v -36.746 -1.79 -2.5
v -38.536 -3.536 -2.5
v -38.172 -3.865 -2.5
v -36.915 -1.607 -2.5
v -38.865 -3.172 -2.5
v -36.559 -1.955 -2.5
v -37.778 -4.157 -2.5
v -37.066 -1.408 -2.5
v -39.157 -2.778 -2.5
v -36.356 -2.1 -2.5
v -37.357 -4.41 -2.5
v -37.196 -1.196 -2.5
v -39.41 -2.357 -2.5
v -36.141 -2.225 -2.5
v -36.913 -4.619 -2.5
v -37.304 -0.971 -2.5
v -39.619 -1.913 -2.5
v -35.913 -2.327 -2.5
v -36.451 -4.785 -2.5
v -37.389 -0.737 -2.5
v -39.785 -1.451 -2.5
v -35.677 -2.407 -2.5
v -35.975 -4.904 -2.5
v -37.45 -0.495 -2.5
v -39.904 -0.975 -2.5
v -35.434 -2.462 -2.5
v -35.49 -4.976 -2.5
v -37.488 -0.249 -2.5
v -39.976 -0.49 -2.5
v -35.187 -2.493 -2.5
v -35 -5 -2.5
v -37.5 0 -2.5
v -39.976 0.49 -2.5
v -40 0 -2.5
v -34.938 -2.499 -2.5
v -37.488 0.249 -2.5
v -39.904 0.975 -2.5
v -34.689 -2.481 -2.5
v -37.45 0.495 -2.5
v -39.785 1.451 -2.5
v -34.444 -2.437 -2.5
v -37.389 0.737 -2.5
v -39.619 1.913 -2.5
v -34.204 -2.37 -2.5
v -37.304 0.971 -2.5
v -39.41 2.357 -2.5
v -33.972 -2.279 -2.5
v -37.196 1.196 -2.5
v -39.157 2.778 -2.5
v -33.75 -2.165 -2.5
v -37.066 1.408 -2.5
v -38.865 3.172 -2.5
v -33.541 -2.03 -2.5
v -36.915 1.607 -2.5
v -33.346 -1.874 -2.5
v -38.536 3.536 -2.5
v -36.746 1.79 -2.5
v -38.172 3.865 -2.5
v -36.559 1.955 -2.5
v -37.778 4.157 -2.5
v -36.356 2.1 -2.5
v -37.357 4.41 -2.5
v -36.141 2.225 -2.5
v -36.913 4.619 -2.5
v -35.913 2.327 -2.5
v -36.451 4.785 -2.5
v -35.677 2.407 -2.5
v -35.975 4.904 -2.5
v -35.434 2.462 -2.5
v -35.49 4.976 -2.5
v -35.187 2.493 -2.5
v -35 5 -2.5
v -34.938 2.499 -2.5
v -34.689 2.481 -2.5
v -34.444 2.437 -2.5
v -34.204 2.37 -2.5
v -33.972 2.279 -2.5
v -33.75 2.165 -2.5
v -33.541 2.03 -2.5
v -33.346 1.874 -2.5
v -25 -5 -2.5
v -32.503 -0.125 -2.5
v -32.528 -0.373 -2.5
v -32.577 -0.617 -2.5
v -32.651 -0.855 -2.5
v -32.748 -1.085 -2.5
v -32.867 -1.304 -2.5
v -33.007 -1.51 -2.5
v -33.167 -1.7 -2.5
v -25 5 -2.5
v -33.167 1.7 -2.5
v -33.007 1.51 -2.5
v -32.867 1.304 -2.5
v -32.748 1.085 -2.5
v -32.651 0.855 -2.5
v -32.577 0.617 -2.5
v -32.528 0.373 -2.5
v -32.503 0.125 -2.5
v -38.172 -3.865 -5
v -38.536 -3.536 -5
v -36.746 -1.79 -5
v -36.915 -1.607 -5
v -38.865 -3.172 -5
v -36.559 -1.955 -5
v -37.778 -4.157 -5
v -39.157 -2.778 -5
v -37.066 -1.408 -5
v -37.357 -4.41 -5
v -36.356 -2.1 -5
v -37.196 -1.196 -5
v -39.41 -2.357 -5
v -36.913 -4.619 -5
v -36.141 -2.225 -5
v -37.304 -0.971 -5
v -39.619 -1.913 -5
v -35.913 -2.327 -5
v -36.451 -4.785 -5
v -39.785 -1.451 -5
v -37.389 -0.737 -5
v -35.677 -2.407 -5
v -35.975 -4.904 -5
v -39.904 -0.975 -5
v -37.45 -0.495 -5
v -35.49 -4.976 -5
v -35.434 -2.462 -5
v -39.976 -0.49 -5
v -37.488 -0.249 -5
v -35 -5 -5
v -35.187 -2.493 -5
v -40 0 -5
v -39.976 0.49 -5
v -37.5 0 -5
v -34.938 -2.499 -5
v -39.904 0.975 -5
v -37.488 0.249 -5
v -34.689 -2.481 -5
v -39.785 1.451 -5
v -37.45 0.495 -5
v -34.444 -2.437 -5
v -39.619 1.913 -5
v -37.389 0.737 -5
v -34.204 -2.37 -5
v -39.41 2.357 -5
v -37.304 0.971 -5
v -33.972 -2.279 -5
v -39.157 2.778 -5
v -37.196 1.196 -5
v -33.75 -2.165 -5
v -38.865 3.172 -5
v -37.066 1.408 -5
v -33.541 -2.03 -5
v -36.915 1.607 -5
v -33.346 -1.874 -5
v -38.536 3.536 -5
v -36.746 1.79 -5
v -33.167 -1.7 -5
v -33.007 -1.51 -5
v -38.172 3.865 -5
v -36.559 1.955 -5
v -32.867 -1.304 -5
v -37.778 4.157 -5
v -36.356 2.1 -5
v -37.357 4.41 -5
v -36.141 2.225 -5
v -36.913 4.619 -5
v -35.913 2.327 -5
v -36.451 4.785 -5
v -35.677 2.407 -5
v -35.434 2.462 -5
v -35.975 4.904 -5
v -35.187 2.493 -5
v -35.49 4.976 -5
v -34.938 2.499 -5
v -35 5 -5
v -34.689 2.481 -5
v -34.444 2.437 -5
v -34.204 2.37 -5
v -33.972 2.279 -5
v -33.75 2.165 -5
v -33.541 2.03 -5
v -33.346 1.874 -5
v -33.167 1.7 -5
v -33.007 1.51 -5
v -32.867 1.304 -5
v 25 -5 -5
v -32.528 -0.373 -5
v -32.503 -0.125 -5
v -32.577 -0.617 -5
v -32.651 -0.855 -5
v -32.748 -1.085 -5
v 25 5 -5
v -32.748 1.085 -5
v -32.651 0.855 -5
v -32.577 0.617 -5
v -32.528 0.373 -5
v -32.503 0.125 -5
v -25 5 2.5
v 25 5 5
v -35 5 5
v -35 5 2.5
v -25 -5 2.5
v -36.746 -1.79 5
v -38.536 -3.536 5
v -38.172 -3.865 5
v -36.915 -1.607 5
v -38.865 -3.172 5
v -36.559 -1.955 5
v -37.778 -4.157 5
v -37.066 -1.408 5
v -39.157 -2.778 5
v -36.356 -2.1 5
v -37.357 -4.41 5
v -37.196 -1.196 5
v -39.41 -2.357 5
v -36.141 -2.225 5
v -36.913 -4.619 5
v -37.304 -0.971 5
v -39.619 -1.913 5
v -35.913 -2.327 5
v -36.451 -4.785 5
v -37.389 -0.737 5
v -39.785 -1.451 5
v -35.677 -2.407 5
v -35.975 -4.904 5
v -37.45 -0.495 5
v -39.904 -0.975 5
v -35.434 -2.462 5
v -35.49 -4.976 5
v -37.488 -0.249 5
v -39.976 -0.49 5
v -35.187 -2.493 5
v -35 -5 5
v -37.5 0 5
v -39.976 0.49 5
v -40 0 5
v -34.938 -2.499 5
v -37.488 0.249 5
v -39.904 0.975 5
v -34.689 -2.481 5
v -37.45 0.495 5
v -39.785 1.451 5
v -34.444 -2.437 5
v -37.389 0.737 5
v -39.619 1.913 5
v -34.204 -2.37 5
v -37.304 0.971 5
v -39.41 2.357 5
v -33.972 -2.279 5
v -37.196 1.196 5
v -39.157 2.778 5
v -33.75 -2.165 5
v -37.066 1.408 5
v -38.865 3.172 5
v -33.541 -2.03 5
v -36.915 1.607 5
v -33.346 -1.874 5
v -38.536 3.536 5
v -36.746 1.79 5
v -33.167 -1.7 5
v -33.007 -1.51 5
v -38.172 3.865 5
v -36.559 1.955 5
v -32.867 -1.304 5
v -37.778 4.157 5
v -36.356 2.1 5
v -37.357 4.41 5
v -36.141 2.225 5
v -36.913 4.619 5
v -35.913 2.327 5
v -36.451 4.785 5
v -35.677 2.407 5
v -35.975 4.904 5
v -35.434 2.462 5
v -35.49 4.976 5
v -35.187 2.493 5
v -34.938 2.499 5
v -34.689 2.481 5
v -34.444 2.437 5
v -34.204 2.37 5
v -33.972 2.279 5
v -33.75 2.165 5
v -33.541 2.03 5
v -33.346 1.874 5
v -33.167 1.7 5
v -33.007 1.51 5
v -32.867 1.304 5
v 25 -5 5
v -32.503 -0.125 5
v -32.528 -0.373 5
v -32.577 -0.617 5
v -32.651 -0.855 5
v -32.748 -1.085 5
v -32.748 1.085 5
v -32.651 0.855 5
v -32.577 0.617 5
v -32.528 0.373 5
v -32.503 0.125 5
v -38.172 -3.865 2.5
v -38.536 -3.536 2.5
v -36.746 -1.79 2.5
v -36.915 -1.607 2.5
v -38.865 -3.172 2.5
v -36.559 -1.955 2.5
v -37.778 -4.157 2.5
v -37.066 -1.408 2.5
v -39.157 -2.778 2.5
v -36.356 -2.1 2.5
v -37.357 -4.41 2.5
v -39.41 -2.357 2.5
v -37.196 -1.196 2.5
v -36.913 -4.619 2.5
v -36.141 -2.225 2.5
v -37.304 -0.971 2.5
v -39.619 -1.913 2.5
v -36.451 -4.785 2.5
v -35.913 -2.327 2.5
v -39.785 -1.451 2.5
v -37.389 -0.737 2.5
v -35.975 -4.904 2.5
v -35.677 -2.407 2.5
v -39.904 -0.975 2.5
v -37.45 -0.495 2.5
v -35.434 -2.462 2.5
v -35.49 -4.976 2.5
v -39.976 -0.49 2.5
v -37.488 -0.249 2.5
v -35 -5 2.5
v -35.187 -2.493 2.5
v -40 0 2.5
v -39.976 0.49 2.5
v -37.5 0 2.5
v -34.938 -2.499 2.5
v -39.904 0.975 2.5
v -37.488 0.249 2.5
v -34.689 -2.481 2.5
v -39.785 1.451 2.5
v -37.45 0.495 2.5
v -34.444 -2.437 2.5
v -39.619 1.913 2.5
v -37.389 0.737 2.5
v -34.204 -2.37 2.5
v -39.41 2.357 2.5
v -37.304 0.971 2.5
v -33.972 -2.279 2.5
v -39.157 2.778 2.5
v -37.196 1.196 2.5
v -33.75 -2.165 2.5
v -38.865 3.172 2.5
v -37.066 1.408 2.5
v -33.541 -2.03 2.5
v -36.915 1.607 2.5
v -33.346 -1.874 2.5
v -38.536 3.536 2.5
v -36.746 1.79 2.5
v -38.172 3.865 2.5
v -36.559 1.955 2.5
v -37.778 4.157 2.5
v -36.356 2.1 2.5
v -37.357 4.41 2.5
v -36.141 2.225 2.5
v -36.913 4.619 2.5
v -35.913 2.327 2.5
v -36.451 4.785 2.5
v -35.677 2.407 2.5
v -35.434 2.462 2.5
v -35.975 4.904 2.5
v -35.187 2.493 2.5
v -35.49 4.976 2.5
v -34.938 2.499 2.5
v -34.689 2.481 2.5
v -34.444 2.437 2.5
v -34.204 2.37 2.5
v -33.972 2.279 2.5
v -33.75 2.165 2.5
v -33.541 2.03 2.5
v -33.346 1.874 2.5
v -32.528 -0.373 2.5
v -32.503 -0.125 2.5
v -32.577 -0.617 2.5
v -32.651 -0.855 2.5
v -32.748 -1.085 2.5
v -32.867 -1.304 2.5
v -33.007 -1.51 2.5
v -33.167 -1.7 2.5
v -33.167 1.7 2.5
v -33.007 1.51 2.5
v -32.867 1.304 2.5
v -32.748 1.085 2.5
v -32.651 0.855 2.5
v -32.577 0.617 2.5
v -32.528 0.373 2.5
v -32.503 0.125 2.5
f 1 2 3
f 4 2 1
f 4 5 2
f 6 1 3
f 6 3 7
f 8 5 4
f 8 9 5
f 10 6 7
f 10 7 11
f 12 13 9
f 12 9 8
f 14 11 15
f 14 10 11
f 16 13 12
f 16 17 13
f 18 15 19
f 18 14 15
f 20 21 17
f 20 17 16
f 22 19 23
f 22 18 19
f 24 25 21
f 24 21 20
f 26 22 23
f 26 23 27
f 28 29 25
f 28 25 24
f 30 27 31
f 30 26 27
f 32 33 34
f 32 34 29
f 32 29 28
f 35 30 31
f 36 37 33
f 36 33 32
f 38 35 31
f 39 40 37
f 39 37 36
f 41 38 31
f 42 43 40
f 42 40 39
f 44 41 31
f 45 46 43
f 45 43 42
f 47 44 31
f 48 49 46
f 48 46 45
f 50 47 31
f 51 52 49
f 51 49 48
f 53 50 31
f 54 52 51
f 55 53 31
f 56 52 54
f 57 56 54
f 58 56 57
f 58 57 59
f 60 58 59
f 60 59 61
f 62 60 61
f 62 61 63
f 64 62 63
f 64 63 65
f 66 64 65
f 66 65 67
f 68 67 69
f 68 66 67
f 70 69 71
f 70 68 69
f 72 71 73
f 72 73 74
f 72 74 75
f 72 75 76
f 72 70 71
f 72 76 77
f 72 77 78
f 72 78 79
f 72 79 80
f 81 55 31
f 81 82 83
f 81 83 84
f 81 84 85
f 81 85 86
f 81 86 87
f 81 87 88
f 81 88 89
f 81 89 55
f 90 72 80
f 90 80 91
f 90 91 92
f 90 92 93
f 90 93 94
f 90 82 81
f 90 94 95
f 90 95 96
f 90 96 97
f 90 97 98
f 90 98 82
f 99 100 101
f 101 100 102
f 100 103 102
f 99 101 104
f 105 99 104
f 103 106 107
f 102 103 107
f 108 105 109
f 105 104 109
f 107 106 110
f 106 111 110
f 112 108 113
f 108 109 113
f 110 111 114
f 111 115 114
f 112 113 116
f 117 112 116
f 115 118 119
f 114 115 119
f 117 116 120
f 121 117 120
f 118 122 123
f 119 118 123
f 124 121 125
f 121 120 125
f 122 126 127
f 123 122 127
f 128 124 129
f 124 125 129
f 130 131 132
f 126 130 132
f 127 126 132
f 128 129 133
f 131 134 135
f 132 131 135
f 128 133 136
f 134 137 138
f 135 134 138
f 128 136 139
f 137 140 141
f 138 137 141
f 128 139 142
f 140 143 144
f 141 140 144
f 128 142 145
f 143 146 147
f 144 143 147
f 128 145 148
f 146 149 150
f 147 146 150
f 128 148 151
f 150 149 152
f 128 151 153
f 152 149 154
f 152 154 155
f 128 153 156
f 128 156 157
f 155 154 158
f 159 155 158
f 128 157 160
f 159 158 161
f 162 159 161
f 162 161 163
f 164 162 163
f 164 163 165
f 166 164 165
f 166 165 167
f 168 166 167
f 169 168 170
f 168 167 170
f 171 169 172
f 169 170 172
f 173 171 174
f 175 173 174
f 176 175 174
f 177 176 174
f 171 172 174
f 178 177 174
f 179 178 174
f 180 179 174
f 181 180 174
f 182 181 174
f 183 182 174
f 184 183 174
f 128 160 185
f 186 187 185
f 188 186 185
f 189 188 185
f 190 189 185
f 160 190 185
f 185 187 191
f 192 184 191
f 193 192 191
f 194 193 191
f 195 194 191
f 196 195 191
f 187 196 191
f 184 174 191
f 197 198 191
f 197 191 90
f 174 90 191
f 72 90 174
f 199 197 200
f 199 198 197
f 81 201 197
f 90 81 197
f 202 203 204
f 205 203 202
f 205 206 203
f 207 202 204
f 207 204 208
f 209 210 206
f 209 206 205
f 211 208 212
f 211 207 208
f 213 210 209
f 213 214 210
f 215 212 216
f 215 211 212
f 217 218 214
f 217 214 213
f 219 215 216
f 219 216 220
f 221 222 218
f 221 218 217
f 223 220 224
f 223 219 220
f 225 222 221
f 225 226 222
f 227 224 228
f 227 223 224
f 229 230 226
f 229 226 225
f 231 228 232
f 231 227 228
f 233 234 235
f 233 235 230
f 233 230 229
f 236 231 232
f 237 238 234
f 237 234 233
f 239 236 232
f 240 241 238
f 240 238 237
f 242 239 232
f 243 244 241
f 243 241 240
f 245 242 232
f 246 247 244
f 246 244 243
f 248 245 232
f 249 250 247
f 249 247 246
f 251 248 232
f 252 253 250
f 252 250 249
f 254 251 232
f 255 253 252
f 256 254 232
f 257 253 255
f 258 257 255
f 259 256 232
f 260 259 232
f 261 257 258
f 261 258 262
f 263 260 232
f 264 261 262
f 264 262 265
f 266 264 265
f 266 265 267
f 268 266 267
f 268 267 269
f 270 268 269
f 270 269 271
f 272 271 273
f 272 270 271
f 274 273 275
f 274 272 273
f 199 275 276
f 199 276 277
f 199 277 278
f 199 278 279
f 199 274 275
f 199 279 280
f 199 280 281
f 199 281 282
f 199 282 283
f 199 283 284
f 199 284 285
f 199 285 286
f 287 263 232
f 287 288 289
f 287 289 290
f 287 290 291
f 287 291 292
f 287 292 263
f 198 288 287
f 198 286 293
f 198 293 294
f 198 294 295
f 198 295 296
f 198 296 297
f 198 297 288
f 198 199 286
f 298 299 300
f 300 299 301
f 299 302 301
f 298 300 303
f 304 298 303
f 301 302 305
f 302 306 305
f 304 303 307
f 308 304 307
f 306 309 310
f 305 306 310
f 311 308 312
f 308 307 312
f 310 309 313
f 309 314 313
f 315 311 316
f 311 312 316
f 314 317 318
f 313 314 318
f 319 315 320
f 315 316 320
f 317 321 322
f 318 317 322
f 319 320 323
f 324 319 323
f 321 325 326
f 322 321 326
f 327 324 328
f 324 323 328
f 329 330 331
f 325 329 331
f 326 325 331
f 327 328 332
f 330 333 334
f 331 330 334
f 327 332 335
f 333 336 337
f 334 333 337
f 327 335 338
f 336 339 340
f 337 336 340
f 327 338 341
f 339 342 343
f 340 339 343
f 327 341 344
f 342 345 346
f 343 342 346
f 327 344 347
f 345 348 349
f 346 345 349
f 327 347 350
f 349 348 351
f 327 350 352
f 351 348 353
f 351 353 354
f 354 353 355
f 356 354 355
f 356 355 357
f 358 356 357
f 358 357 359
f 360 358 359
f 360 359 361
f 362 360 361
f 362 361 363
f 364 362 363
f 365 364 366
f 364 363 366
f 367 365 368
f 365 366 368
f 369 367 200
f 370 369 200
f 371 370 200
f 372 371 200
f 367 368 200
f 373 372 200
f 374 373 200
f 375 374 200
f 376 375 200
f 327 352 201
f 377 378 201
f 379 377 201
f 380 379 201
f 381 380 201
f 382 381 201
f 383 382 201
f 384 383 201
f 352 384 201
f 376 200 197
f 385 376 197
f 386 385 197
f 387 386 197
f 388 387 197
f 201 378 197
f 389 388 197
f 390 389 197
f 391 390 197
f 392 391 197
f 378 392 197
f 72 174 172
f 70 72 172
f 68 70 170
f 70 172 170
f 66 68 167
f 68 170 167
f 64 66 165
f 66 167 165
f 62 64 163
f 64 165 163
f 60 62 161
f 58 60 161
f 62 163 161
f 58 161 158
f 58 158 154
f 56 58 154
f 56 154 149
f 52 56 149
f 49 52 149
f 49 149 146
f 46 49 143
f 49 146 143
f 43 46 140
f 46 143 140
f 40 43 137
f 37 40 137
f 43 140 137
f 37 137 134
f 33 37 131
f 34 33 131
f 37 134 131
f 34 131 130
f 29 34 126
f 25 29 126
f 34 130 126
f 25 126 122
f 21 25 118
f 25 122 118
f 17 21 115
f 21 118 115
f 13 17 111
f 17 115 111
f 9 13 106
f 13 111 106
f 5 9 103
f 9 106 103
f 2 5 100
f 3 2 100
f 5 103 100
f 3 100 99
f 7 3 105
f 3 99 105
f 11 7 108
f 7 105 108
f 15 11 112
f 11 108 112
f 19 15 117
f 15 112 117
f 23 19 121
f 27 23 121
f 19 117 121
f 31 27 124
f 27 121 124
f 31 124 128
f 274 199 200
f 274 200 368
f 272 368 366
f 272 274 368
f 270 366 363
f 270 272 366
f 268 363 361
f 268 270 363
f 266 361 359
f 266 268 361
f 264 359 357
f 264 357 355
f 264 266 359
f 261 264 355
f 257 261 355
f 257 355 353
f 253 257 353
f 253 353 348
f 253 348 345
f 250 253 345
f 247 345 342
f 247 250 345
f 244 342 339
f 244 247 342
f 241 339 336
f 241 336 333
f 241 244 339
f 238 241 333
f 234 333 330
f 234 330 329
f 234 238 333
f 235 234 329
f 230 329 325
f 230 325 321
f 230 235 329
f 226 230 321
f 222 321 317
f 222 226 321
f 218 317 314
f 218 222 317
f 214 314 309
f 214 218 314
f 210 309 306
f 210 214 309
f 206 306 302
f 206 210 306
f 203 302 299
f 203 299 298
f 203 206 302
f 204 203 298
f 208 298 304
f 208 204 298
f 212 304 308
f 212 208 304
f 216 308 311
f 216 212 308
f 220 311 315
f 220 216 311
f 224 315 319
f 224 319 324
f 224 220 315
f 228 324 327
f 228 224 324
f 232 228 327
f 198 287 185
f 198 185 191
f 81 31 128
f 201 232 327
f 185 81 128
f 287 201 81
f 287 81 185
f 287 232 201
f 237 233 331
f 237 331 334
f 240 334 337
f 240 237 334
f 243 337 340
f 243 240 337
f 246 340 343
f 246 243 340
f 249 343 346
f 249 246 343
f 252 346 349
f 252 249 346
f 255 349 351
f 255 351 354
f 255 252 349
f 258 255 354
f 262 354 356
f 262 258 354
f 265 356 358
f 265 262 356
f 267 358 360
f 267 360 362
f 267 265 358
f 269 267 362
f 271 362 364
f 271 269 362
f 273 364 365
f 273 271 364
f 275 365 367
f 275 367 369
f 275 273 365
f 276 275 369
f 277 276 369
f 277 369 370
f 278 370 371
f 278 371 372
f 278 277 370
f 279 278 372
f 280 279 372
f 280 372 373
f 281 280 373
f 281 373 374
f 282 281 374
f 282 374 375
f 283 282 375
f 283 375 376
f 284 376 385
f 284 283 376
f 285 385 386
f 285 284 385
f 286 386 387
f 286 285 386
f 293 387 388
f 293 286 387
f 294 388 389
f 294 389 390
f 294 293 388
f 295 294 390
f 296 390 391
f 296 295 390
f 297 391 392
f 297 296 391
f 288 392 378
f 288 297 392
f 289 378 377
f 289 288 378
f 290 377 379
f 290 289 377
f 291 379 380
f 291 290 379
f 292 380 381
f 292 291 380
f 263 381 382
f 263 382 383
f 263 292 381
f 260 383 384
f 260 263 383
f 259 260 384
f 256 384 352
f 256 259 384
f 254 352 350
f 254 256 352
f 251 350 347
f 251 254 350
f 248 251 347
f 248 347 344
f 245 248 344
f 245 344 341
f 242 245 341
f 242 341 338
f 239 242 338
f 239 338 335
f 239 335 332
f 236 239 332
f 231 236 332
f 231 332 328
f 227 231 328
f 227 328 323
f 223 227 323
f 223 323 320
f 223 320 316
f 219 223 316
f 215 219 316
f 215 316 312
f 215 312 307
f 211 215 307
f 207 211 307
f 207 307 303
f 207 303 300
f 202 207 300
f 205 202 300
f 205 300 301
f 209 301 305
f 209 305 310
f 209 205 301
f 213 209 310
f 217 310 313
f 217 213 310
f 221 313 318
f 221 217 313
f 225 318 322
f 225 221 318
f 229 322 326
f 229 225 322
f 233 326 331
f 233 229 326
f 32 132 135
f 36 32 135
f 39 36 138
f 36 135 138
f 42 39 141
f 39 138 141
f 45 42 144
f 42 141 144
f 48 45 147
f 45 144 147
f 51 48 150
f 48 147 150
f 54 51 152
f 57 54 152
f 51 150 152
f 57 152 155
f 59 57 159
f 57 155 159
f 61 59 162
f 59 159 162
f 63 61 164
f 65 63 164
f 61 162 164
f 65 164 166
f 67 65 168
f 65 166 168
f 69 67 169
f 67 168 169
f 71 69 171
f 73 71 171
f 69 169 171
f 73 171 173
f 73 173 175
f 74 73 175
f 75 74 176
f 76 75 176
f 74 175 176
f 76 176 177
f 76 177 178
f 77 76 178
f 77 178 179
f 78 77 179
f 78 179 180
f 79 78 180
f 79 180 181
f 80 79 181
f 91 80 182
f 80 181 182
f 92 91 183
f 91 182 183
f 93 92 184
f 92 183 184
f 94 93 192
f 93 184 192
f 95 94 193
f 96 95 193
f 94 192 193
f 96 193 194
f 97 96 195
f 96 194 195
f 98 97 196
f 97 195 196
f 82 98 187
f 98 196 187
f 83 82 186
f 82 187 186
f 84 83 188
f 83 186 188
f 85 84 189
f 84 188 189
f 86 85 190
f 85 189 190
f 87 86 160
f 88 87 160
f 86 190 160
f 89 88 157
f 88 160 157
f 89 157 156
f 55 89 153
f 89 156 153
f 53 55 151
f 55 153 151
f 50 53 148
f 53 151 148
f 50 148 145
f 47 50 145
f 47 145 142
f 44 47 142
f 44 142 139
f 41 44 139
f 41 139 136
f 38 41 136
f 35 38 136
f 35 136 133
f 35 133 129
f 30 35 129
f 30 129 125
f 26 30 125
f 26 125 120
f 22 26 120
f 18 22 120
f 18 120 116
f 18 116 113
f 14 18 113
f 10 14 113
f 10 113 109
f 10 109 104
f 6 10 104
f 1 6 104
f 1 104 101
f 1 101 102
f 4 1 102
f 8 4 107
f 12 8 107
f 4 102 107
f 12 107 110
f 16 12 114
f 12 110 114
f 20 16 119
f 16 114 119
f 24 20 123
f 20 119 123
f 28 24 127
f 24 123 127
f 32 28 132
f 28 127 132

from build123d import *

# Parameters (mm, degrees)
SKETCH_1_W      = 50
SKETCH_1_H      = 10
EXTRUDE_1_DEPTH = 5
SKETCH_2_R      = 2.5
EXTRUDE_2_DEPTH = 2.5


with BuildPart() as part:
    # 草图1 → 凸台-拉伸1 (new, symmetric)
    with BuildSketch(Plane.XY):
        Rectangle(SKETCH_1_W, SKETCH_1_H)
    extrude(amount=EXTRUDE_1_DEPTH, both=True)

    # 草图2 → 凸台-拉伸2 (add)
    with BuildSketch(Plane(origin=(0, 0, -5), x_dir=(-1, 0, 0), z_dir=(0, 0, -1))):
        with BuildLine():
            Line((25, 5), (35, 5))
            ThreePointArc((35, 5), (40, 0), (35, -5))
            Line((35, -5), (25, -5))
            Line((25, -5), (25, 5))
        make_face()
        with Locations((35, 0)):
            Circle(SKETCH_2_R, mode=Mode.SUBTRACT)
    extrude_2 = extrude(amount=-EXTRUDE_2_DEPTH)

    # 镜向1: 凸台-拉伸2 across plane
    add(extrude_2.mirror(Plane.XY))


solid = part.part
